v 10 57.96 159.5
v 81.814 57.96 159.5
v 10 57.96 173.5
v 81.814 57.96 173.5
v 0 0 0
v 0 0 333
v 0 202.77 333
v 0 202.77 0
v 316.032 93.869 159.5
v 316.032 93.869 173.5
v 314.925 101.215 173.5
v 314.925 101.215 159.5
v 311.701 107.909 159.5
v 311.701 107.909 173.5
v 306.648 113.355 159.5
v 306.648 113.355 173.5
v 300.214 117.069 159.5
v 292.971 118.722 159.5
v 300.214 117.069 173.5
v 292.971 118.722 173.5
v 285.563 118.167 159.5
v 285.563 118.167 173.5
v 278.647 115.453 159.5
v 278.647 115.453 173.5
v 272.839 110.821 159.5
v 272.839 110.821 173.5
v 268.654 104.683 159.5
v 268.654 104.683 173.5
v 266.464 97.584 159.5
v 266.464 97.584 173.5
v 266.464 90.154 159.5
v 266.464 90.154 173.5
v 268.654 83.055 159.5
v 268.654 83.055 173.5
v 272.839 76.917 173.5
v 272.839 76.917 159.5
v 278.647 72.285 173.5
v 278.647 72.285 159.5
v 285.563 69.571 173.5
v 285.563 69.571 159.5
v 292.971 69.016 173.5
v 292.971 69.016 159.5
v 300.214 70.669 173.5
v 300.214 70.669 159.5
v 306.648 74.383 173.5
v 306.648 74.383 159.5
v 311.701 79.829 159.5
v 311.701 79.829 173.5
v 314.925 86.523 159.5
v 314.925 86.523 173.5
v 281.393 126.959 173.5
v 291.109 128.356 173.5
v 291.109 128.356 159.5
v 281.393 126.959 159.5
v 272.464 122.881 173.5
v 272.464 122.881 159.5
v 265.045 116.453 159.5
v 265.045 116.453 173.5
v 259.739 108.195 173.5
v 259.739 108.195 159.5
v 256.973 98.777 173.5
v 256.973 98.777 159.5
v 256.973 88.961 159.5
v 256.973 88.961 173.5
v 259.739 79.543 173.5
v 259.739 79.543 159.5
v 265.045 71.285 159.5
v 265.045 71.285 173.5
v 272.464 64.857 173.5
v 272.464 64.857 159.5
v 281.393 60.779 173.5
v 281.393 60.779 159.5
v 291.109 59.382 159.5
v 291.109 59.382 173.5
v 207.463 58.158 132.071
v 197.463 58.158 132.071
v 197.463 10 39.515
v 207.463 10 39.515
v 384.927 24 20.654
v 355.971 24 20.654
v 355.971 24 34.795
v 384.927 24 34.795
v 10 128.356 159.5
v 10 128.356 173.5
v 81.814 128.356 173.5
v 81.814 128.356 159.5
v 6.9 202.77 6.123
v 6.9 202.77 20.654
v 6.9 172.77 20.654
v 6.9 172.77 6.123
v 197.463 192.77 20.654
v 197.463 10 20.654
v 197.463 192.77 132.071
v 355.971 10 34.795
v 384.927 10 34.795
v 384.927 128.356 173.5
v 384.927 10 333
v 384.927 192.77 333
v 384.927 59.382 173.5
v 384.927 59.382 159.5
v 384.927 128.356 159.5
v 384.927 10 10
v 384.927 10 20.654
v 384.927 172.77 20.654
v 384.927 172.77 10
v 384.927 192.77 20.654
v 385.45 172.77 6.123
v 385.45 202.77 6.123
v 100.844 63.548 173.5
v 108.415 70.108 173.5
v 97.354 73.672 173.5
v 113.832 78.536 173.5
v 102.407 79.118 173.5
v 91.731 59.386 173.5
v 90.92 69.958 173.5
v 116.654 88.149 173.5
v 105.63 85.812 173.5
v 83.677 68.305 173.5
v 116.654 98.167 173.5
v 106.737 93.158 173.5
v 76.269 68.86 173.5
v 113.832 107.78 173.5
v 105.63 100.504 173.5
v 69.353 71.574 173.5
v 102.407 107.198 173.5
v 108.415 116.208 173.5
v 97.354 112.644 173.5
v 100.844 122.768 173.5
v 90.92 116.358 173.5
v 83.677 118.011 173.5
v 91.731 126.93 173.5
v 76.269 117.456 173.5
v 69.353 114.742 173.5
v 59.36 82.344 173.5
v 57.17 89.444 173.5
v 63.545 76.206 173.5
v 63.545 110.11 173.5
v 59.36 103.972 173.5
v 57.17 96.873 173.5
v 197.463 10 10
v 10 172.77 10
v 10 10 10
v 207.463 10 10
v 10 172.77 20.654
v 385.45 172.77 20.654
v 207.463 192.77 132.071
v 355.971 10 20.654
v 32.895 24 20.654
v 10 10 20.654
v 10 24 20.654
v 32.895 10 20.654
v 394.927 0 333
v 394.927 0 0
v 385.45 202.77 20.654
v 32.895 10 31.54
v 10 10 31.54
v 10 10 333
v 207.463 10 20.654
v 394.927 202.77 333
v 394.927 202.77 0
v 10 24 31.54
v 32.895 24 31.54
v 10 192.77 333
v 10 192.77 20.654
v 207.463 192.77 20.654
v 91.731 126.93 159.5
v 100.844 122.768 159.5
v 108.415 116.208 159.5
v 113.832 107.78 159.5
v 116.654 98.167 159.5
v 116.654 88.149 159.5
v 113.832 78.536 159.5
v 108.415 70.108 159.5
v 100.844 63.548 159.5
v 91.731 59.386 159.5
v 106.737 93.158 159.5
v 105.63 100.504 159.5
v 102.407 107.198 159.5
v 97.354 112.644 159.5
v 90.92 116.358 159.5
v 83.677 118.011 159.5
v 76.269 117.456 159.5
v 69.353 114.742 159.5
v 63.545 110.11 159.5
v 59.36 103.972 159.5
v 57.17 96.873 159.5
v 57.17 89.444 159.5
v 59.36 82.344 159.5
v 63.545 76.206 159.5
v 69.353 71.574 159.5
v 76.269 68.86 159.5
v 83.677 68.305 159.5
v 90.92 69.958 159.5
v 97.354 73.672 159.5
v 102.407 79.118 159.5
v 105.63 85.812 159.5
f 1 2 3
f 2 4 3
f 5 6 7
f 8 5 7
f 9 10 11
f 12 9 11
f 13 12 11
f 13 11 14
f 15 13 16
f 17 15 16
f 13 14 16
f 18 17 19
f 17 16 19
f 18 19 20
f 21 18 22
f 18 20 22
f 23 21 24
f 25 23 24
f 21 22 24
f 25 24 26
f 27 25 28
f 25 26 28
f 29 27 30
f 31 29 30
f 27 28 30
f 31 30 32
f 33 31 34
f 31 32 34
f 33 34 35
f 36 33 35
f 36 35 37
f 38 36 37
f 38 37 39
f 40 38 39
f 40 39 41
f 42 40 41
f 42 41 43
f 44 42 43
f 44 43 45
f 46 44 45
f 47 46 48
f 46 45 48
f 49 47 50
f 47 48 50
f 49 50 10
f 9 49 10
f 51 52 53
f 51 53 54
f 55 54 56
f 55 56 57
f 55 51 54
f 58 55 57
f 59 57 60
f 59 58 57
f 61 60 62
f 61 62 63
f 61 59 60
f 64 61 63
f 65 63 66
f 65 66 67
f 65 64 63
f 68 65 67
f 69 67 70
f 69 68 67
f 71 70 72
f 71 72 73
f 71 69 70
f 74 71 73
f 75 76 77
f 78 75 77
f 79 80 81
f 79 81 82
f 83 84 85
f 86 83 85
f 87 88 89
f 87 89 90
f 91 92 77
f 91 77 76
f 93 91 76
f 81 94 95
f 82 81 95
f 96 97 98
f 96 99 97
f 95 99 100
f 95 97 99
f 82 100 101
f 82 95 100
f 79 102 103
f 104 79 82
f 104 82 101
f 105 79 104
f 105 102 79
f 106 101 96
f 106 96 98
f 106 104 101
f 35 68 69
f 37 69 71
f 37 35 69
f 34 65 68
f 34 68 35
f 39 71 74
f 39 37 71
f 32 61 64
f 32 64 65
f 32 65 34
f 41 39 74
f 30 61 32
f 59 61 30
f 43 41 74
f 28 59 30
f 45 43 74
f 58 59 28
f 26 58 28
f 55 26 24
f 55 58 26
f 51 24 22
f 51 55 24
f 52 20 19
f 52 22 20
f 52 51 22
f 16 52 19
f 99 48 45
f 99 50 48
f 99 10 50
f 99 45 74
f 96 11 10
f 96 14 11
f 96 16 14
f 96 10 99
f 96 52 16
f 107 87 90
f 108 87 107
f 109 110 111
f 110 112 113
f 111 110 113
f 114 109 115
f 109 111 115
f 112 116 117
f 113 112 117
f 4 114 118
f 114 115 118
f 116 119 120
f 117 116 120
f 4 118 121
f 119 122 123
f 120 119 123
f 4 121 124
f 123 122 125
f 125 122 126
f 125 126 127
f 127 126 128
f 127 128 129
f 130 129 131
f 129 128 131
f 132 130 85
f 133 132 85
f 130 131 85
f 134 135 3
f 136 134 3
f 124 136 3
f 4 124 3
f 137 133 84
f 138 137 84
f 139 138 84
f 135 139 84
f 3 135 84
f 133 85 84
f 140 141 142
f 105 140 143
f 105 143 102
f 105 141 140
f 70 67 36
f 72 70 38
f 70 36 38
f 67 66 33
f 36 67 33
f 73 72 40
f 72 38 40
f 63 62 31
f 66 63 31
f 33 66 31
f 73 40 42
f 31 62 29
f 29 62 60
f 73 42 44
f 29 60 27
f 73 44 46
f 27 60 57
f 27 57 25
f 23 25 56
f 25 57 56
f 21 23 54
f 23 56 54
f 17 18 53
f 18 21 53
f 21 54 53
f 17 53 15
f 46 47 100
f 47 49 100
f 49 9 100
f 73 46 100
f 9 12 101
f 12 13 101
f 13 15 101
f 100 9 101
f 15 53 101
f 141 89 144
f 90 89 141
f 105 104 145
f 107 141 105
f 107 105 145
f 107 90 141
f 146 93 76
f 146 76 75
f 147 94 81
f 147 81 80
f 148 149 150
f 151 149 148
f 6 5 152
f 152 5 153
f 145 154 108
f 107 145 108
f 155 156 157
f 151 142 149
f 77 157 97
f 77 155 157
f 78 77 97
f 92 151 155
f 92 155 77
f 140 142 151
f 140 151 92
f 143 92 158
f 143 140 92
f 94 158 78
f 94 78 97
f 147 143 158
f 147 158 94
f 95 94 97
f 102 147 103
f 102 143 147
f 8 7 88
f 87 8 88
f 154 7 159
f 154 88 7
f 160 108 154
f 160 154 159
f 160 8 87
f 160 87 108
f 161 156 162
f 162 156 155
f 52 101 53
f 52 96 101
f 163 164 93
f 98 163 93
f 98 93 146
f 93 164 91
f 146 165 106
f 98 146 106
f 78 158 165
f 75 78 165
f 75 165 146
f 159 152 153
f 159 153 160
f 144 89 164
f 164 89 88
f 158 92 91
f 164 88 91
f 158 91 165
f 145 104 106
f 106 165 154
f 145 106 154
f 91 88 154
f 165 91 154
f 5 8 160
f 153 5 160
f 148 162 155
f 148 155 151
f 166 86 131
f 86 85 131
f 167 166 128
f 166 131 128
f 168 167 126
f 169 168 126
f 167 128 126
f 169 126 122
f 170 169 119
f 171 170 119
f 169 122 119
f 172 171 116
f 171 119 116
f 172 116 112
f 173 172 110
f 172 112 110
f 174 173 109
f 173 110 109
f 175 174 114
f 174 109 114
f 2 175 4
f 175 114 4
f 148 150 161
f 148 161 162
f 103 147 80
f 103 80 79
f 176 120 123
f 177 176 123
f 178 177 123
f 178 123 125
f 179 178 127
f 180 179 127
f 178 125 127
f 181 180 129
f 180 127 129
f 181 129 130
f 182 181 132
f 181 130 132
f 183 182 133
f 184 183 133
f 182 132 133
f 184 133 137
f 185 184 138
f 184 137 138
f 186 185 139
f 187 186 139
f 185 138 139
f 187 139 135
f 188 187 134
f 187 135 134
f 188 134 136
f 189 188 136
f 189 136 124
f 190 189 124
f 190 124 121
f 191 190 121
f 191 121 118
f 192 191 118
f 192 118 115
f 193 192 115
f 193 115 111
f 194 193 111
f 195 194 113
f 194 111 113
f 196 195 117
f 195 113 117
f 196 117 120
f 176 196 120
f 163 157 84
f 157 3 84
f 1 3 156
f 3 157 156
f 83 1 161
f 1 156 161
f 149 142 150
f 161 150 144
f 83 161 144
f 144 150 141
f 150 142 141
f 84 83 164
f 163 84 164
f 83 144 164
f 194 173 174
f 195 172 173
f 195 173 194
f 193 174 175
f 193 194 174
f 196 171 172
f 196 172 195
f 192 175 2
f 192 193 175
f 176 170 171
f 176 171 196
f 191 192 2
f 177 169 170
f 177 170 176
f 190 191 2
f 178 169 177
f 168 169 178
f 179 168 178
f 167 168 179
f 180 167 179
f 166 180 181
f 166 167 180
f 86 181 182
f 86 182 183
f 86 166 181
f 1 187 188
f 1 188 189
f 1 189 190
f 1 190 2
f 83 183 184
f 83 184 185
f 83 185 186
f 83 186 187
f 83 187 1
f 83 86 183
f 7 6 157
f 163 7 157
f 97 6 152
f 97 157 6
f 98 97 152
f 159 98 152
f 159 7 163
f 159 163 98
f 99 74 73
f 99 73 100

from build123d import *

# Parameters (mm, degrees)
SKETCH1_W           = 394.926652775
SKETCH1_H           = 202.769674437
BOSS_EXTRUDE1_DEPTH = 333
SHELL5_T            = -10
BOSS_EXTRUDE2_DEPTH = 7
SKETCH19_R          = 24.92303726
CUT_EXTRUDE1_DEPTH  = 14
BOSS_EXTRUDE3_DEPTH = 7
SKETCH23_R          = 24.92303726
CUT_EXTRUDE2_DEPTH  = 14
SKETCH24_W          = 378.549978472
SKETCH24_H          = 14.5311901
CUT_EXTRUDE6_DEPTH  = 30
SKETCH25_W          = 25.994787148
SKETCH25_H          = 10.885886146
BOSS_EXTRUDE5_DEPTH = 14
SKETCH27_W          = 29.478735589
SKETCH27_H          = 14.140745891
BOSS_EXTRUDE7_DEPTH = 14
EXTRUDE_THIN2_REACH = 553.377
SKETCH33_W          = 10
SKETCH33_H          = 122.071459974
CUT_EXTRUDE8_DEPTH  = 49
SKETCH35_W          = 10
SKETCH35_H          = 10.654236951
CUT_EXTRUDE11_DEPTH = 182.769674437


with BuildPart() as part:
    # Sketch1 → Boss-Extrude1 (new body)
    with BuildSketch(Plane.XY):
        with Locations((197.463326388, 101.384837219)):
            Rectangle(SKETCH1_W, SKETCH1_H)
    extrude(amount=BOSS_EXTRUDE1_DEPTH)

    # Shell5
    shell5_openings = [part.faces().sort_by_distance(p)[0] for p in [
        (197.463326387, 101.384837219, 333),
    ]]
    offset(amount=SHELL5_T, openings=shell5_openings, kind=Kind.INTERSECTION)

    # Sketch18 → Boss-Extrude2 (add, symmetric)
    with BuildSketch(Plane.XY.offset(166.5)):
        with BuildLine():
            Line((10, 128.355944405), (81.814439739, 128.355944405))
            ThreePointArc((81.814439739, 128.355944405), (117.012291579, 93.158092565), (81.814439739, 57.960240724))
            Line((81.814439739, 57.960240724), (10, 57.960240724))
            Line((10, 57.960240724), (10, 128.355944405))
        make_face()
    extrude(amount=BOSS_EXTRUDE2_DEPTH, both=True)

    # Sketch19 → Cut-Extrude1 (cut)
    with BuildSketch(Plane.XY.offset(173.5)):
        with Locations((81.814439739, 93.158092565)):
            Circle(SKETCH19_R)
    extrude(amount=-CUT_EXTRUDE1_DEPTH, mode=Mode.SUBTRACT)

    # Sketch22 → Boss-Extrude3 (add, symmetric)
    with BuildSketch(Plane.XY.offset(166.5)):
        with BuildLine():
            Line((384.926652775, 128.355944405), (291.108955259, 128.355944405))
            ThreePointArc((291.108955259, 128.355944405), (256.621992249, 93.868981396), (291.108955259, 59.382018386))
            Line((291.108955259, 59.382018386), (384.926652775, 59.382018386))
            Line((384.926652775, 59.382018386), (384.926652775, 128.355944405))
        make_face()
    extrude(amount=BOSS_EXTRUDE3_DEPTH, both=True)

    # Sketch23 → Cut-Extrude2 (cut)
    with BuildSketch(Plane.XY.offset(173.5)):
        with Locations((291.108955259, 93.868981396)):
            Circle(SKETCH23_R)
    extrude(amount=-CUT_EXTRUDE2_DEPTH, mode=Mode.SUBTRACT)

    # Sketch24 → Cut-Extrude6 (cut)
    with BuildSketch(Plane(origin=(0, 202.769674437, 0), x_dir=(1, 0, 0), z_dir=(0, 1, 0))):
        with Locations((196.17510715, -13.388641901)):
            Rectangle(SKETCH24_W, SKETCH24_H)
    extrude(amount=-CUT_EXTRUDE6_DEPTH, mode=Mode.SUBTRACT)

    # Sketch25 → Boss-Extrude5 (add)
    with BuildSketch(Plane(origin=(0, 10, 0), x_dir=(1, 0, 0), z_dir=(0, 1, 0))):
        with Locations((19.897511488, -26.097180024)):
            Rectangle(SKETCH25_W, SKETCH25_H)
    extrude(amount=BOSS_EXTRUDE5_DEPTH)

    # Sketch27 → Boss-Extrude7 (add)
    with BuildSketch(Plane(origin=(0, 10, 0), x_dir=(1, 0, 0), z_dir=(0, 1, 0))):
        with Locations((370.710728592, -27.724609897)):
            Rectangle(SKETCH27_W, SKETCH27_H)
    extrude(amount=BOSS_EXTRUDE7_DEPTH)

    # Sketch33 → Extrude-Thin2 (add, up to next)
    with BuildSketch(Plane.XZ.offset(-192.769674437), mode=Mode.PRIVATE) as extrude_thin2_sk1:
        with Locations((202.463326387, 71.035729987)):
            Rectangle(SKETCH33_W, SKETCH33_H)
    extrude_thin2_tool1 = extrude(extrude_thin2_sk1.sketch, amount=EXTRUDE_THIN2_REACH, mode=Mode.PRIVATE) - part.part
    add(extrude_thin2_tool1.solids().sort_by_distance((202.463326, 192.769674, 71.03573))[0])

    # Sketch34 → Cut-Extrude8 (cut)
    with BuildSketch(Plane.ZY.offset(-197.463326387)):
        Polygon((132.071459974, 58.157894262), (39.515170412, 10), (132.071459974, 10), align=None)
    extrude(amount=-CUT_EXTRUDE8_DEPTH, mode=Mode.SUBTRACT)

    # Sketch35 → Cut-Extrude11 (cut)
    with BuildSketch(Plane(origin=(0, 192.769674437, 0), x_dir=(1, 0, 0), z_dir=(0, 1, 0))):
        with Locations((202.463326387, -15.327118476)):
            Rectangle(SKETCH35_W, SKETCH35_H)
    extrude(amount=-CUT_EXTRUDE11_DEPTH, mode=Mode.SUBTRACT)


solid = part.part
